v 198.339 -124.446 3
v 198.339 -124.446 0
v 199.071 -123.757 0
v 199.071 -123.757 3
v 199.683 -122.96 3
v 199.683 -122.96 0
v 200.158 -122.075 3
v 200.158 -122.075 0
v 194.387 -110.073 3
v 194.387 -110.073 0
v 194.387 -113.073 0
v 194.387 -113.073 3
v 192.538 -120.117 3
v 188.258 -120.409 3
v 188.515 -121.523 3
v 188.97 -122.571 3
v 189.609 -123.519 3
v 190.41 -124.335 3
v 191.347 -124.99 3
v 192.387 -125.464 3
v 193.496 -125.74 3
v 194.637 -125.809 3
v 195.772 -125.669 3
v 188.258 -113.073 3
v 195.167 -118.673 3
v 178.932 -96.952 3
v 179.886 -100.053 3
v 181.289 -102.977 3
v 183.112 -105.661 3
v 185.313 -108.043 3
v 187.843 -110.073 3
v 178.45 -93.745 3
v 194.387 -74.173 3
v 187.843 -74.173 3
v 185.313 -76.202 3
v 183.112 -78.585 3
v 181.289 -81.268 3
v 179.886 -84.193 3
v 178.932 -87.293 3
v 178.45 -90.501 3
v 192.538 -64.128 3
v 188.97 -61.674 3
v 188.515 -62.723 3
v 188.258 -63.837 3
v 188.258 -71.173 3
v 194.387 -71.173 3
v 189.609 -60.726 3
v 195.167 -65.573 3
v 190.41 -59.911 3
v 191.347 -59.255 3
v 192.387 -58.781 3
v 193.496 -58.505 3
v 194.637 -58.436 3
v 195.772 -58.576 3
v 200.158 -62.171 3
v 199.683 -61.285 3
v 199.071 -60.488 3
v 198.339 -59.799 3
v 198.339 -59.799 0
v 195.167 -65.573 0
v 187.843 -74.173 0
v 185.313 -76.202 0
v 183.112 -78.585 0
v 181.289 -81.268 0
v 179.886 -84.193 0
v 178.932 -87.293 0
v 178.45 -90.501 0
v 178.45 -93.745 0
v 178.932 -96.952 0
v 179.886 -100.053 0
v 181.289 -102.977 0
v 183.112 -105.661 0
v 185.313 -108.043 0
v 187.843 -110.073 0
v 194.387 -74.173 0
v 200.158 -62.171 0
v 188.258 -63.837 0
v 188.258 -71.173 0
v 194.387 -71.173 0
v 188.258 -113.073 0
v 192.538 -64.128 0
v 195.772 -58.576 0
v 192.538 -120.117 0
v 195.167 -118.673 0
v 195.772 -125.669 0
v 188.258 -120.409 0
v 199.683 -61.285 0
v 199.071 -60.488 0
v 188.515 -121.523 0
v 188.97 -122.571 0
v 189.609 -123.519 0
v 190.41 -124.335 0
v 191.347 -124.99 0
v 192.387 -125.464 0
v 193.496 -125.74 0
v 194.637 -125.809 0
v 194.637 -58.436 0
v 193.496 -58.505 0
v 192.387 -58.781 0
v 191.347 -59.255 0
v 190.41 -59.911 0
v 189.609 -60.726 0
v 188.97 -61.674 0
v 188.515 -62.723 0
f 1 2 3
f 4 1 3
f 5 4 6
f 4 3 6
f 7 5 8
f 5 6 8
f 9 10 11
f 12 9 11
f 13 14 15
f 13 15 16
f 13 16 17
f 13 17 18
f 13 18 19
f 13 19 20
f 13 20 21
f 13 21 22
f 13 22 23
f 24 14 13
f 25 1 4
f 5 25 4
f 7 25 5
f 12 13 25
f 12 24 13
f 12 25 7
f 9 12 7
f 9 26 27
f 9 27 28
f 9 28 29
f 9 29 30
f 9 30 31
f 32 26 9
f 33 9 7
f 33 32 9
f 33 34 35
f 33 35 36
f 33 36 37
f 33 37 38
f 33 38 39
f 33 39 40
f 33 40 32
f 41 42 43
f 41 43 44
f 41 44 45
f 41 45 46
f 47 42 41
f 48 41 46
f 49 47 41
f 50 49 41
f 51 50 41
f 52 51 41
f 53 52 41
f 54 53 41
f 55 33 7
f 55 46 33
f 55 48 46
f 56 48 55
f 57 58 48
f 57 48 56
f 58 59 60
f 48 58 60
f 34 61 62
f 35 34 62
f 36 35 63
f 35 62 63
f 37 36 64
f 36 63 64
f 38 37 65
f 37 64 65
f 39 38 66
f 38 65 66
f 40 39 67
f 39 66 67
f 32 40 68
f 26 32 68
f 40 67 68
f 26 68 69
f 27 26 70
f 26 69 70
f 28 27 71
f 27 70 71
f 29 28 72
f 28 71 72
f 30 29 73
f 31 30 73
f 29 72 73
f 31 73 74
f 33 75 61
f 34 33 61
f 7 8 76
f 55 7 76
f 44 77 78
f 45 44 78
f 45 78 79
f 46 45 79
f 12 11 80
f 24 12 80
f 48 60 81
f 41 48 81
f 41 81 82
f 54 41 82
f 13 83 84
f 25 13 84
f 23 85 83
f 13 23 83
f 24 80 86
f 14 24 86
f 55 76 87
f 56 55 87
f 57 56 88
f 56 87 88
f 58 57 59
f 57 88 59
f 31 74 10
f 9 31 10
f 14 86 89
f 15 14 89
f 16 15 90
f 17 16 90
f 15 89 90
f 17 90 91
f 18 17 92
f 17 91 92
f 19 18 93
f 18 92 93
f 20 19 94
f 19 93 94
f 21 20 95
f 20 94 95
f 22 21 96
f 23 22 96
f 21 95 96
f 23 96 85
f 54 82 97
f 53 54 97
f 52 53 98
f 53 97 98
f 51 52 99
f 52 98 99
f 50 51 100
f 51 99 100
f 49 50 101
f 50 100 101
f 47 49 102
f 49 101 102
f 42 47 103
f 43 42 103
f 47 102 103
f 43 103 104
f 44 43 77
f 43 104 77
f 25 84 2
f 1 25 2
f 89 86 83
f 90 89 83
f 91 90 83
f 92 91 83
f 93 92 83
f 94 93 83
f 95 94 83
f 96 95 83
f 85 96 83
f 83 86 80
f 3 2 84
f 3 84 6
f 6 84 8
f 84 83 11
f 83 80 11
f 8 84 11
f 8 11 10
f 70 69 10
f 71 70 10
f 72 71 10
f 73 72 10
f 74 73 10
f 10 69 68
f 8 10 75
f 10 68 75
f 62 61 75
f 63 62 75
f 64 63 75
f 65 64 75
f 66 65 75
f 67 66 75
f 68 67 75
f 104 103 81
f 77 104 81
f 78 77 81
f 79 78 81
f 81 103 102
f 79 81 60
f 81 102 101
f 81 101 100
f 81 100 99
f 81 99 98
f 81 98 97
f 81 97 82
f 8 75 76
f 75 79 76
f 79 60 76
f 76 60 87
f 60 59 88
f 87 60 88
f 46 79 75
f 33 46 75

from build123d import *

# Parameters (mm, degrees)
BASE_EXTRUDE_DEPTH = 3


with BuildPart() as part:
    # Sketch1 → Base-Extrude (new body)
    with BuildSketch(Plane.XY):
        with BuildLine():
            Line((195.167267959, -118.672665529), (198.339039248, -124.445885207))
            ThreePointArc((198.339039248, -124.445885207), (199.392796981, -123.370856688), (200.158445725, -122.07475728))
            Line((200.158445725, -122.07475728), (200.158445725, -62.170573778))
            ThreePointArc((200.158445725, -62.170573778), (199.392796981, -60.874474369), (198.339039248, -59.79944585))
            Line((198.339039248, -59.79944585), (195.167267959, -65.572665529))
            Line((195.167267959, -65.572665529), (192.537947509, -64.128133088))
            Line((192.537947509, -64.128133088), (195.771956334, -58.576419897))
            ThreePointArc((195.771956334, -58.576419897), (190.863435389, -59.561310884), (188.258458895, -63.836551882))
            Line((188.258458895, -63.836551882), (188.258458895, -71.172665529))
            Line((188.258458895, -71.172665529), (194.386873079, -71.172665529))
            Line((194.386873079, -71.172665529), (194.386873079, -74.172665529))
            Line((194.386873079, -74.172665529), (187.843216204, -74.172665529))
            ThreePointArc((187.843216204, -74.172665529), (178.389950643, -92.122665529), (187.843216204, -110.072665529))
            Line((187.843216204, -110.072665529), (194.386873079, -110.072665529))
            Line((194.386873079, -110.072665529), (194.386873079, -113.072665529))
            Line((194.386873079, -113.072665529), (188.258458895, -113.072665529))
            Line((188.258458895, -113.072665529), (188.258458895, -120.408779175))
            ThreePointArc((188.258458895, -120.408779175), (190.863435389, -124.684020173), (195.771956334, -125.66891116))
            Line((195.771956334, -125.66891116), (192.537947509, -120.117197969))
            Line((192.537947509, -120.117197969), (195.167267959, -118.672665529))
        make_face()
    extrude(amount=BASE_EXTRUDE_DEPTH)


solid = part.part
